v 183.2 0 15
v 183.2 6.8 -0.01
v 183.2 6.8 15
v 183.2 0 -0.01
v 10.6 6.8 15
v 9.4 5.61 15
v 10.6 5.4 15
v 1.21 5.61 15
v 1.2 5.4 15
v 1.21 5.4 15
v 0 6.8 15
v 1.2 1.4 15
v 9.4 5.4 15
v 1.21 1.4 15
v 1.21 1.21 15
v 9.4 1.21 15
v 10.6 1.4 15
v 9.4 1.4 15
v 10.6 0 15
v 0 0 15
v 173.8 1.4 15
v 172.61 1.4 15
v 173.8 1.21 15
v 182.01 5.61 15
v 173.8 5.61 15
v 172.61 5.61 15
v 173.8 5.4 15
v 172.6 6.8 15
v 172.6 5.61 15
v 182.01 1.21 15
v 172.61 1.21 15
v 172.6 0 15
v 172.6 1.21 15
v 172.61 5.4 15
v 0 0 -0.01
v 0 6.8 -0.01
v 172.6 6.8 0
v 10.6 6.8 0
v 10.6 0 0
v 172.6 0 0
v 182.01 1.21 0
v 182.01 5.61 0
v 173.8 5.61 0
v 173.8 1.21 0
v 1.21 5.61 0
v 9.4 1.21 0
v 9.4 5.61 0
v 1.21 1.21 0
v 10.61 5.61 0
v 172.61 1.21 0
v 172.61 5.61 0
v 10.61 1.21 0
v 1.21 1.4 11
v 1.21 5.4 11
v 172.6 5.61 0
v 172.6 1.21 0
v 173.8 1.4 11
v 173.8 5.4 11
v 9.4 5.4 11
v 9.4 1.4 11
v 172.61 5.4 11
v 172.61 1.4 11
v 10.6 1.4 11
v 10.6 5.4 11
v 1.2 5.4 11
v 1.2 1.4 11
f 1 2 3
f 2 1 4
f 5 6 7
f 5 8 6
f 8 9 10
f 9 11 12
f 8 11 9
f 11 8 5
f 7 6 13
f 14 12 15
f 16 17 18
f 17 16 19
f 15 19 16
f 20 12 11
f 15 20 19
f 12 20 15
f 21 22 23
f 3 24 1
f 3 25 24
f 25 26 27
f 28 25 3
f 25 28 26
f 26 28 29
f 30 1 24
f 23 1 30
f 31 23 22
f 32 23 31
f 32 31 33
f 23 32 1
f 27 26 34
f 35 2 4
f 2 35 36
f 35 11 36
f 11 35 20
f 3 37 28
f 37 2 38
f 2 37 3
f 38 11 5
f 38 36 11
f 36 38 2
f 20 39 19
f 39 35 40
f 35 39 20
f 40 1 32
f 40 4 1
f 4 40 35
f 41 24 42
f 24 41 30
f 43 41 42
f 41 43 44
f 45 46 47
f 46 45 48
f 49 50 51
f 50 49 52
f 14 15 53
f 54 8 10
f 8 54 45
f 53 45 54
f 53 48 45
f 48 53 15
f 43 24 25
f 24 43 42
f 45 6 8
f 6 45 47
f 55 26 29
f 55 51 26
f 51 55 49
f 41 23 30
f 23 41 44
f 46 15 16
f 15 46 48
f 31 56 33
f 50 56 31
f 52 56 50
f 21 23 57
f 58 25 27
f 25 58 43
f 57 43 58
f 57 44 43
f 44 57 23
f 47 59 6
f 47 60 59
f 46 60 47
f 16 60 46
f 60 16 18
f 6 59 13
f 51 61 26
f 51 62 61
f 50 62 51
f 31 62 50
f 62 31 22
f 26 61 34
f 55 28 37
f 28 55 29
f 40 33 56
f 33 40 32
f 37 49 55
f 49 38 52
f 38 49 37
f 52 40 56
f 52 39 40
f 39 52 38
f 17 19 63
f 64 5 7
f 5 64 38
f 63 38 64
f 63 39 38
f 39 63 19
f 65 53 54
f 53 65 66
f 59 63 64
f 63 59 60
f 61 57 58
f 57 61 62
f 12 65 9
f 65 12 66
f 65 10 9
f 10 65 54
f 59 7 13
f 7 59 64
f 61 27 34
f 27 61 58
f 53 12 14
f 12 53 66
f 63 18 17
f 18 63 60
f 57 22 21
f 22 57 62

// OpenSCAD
// file: ../Base/Boxes.scad
// Fischertechnik Box Foundation
// Pre-designed Boxes

use <Constants.scad>

include <PlacementOptions.scad>

box190Width = 190;
box190Depth = 130;
box130Width = 130;
box130Depth = 95;

// Values are from an original ec3 box
topBottomDifference = 1.5;
outerHeight = 40;
baseThickness = 1.8;
innerHeight = outerHeight - baseThickness;
stackExcess = 5.7;
radius = 3.5;
wallThickness = 1.5;
tolerance = 0.2;

boxWallThickness = wallThickness;
boxBaseThickness = baseThickness;
boxWebWidth = 3.0;

// getBoxWallThickness()
// Gets the wall thickness of a Fischertechnik Box
function getBoxWallThickness() = boxWallThickness;

// getBoxUsageHeight(height = 38.2)
// Gets the usable height of a Fischertechnik box
// height = Outer height of the box from the bottom to the upper edge.
function getBoxUsageHeight(height = outerHeight) = height - baseThickness - stackExcess;

// getBoxInnerHeight()
// Gets the inner height of a Fischertechnik box, including the stack excess
function getBoxInnerHeight() = innerHeight;

// getBoxBaseThickness()
// Gets the thickness of the Fischertechnik box base.
function getBoxBaseThickness() = boxBaseThickness;

// getBoxWebWidth()
// Gets the width of a box web
function getBoxWebWidth() = boxWebWidth;

// getBox190Space()
// Gets the usable inner space of a Box 190 as an x/y-list
function getBox190Space() = [
    box190Width - 2*getBoxWallThickness() - topBottomDifference, 
    box190Depth - 2*getBoxWallThickness() - topBottomDifference ];

// RoundedCornerPlate(width, depth, height, radius)
// Creates a body plate with rounded corners for a box. Used
// also to create the complete box with the hull module.
// width = Width of the plate
// depth = depth of the plate 
// height = thickness of the plate
// radius = radius of the rounded corner
module RoundedCornerPlate(width, depth, height, radius) {
    translate([radius, radius])
    hull() {
        w = width-2*radius;
        d = depth-2*radius;
        cube([w, d, height]);
        cylinder(height, r=radius, $fn=getFragments());
        translate([w, 0])
            cylinder(height, r=radius, $fn=getFragments());
        translate([w, d])
            cylinder(height, r=radius, $fn=getFragments());
        translate([0, d])
            cylinder(height, r=radius, $fn=getFragments());
    }
}

// BoxBase(width, depth)
// Creates an empty stackable Fischertechnik compatible box
// width = Outer width of the box (190, 130, ...)
// depth = Outer depth of the box (130, 95, ...)

module BoxBase(width, depth, height=outerHeight) {    
    thinPlate = 0.01;

    innerHeight = height - baseThickness;    
    
    module Body(tolerance=tolerance) {
        hull() {
            // Bottom with tolerance to fit into the original boxes when stacked
            translate([-wallThickness+tolerance, -wallThickness+tolerance, -baseThickness])
                RoundedCornerPlate(width-topBottomDifference-2*tolerance, depth-topBottomDifference-2*tolerance, thinPlate, radius);
            
            // Top
            translate([-wallThickness-topBottomDifference/2, -wallThickness-topBottomDifference/2, innerHeight-thinPlate])
                RoundedCornerPlate(width, depth, thinPlate, radius);
         }
    }

    module Cutoff() {
        hull() {
            coWidth = width - 2*wallThickness;
            coDepth = depth - 2*wallThickness;
            
            // Bottom
            RoundedCornerPlate(coWidth-topBottomDifference, coDepth-topBottomDifference, thinPlate, radius);

            // Top
            translate([-topBottomDifference/2, -topBottomDifference/2, innerHeight+thinPlate]) 
                RoundedCornerPlate(coWidth, coDepth, thinPlate, radius);
        }
    }
    
    difference() {        
        Body();
        Cutoff();
        stackOffset = innerHeight - stackExcess;
        translate([0, 0, stackOffset + baseThickness])
            Body(tolerance=0);
    }
}

// Creates the Fischertechnik empty box 130x190 mm and places it at position 0,0
// 190x130 are the outer sizes, the inner space is slightly smaller. Use getBox190Space() to get the inner sizes.
// The box is positioned that the usable inner space is at the 0,0,0 position.

module Box190() {
    BoxBase(box190Width, box190Depth);
}

// Gets the usable inner space of a Box 130 as an x/y-list
function getBox130Space() = [
    box130Width - 2*getBoxWallThickness() - topBottomDifference, 
    box130Depth - 2*getBoxWallThickness() - topBottomDifference ];

// Creates the Fischertechnik empty box 95x130 mm and places it at position 0,0
// 190x130 are the outer sizes, the inner space is slightly smaller. Use getBox190Space() to get the inner sizes.
// The box is positioned that the usable inner space is at the 0,0,0 position.

module Box130() {
    BoxBase(box130Width, box130Depth);
}

// Creates a web at the specified box walls
// corner 0 = LowerLeft, 1 = UpperLeft, 2 = UpperRight, 3 = LowerRight
// side 0 = LeftOfCorner, 1 = RightOfCorner
// distance = Distance in mm from the corner
// boxSpace = inner width and depth of the box (default: Box 190)
// webWidth = length of the web (default is 3 mms)
// webThickness = thickness of the web (default is 1 mm)
// height = Height of the web (standard is getBoxUsageHeight())
// sink = How much of the web is sunk into the wall

module BoxWeb(
    corner, 
    side, 
    distance, 
    boxSpace=getBox190Space(), 
    webWidth=getBoxWebWidth(), 
    webThickness=1.0, 
    height=getBoxUsageHeight(),
    sink = getBoxWallThickness()/2) {
    width = (corner % 2 == 0) ? 
            (side == LeftOfCorner ? webWidth : webThickness) :
            (side == LeftOfCorner ? webThickness : webWidth);

    depth = (corner % 2 == 0) ? 
            (side == RightOfCorner ? webWidth : webThickness) :
            (side == RightOfCorner ? webThickness : webWidth);
    
    xDiff = corner == LowerLeft ? 
                (side == LeftOfCorner ? -sink : distance) :
            (corner == UpperLeft ?                
                (side == LeftOfCorner ? distance : -sink) :
            (corner == UpperRight ?
                (side == LeftOfCorner ? boxSpace.x-webWidth+sink : boxSpace.x-distance-webThickness) :
                (side == LeftOfCorner ? boxSpace.x-distance-webThickness: boxSpace.x-webWidth+sink)));

    yDiff = corner == LowerLeft ? 
                (side == RightOfCorner ? -sink : distance) :
            (corner == UpperLeft ?
                (side == RightOfCorner ? boxSpace.y-distance-webThickness : boxSpace.y-webWidth+sink) :
            (corner == UpperRight ?
                (side == RightOfCorner ? boxSpace.y-webWidth+sink : boxSpace.y-distance-webThickness) :
                (side == RightOfCorner ? distance : -sink)));
    
    translate([xDiff, yDiff, -getExcess()])
        cube([width, depth, height + 2*getExcess()]);
}
// file: ../Base/Rotation.scad
// Fischertechnik Box Foundation
// Geometry Helpers Rotation

include <PlacementOptions.scad>

// getRotatedSpace(space, rotation=NoRotation)
// Rotates the space dependent on the specified rotation

function getRotatedSpace(space, rotation=NoRotation) = [
    (rotation == Rotate90 || rotation == Rotate270) ? space.y : space.x,
    (rotation == Rotate90 || rotation == Rotate270) ? space.x : space.y
];

// Rotates the given space around the fixed left lower corner
// space = the space the children needs as width/depth list [width,depth]
// rotation = 0 Rotate0 degrees, 1 Rotate90 degrees, 2 Rotate180 degrees, 3 Rotate270 degrees (equivalent to -90)

module RotateFix(space, rotation=NoRotation) {
    dy = (rotation == Rotate0 || rotation == Rotate270) ? 0 :
        (rotation == Rotate90) ? space.x :
        space.y;
    dx = (rotation < Rotate180) ? 0 :
        (rotation == Rotate180) ? space.x :
        space.y;
    
    translate([dx, dy, 0])
        rotate([0, 0, rotations[rotation]])
            children();
}
// file: ../Base/Alignment.scad
// Fischertechnik Box Foundation
// Geometry Helpers Alignment

include <PlacementOptions.scad>

// getAlignedX(elementWidth, spaceWidth, align=AlignRight, offset=0)
// Gets the aligned X offset of an element with the given
// width in the given space.
// elementWidth = The width of the element to positon
// spaceWidth = The space where the element should be aligned
// align = 0 AlignLeft, 1 AlignCenter, 2 AlignRight
// offset = an optional offset from the aligned position. When
// aligned left or centered, then positive values are in X direction.
// When aligned right then positive values are in negative X direction.

function getAlignedX(elementWidth, spaceWidth, align=AlignRight, offset=0) =
    (align == AlignLeft) ?
        offset :
        ((align == AlignCenter) ?
        (spaceWidth - elementWidth)/2 + offset :
        spaceWidth - offset - elementWidth);

// getAlignedY(elementDepth, spaceDepth, align=AlignTop, offset=0)
// Gets the aligned Y offset of an element with the given
// depth in the given space.
// elementDepth = The depth of the element to positon
// spaceDepth = The space where the element should be aligned
// align = 0 AlignBottom, 1 AlignCenter, 2 AlignTop
// offset = an optional offset from the aligned position. When
// aligned bottom or centered, then positive values are in Y direction.
// When aligned top then positive values are in negative Y direction.

function getAlignedY(elementDepth, spaceDepth, align=AlignTop, offset=0) =
    (align == AlignBottom) ?
        offset :
        ((align == AlignCenter) ?
        (spaceDepth - elementDepth)/2 + offset :
        spaceDepth - offset - elementDepth);
// file: ../Base/PlacementOptions.scad
// Fischertechnik Box Foundation
// Placement Options

// Alignment
NoAlign = 0;
AlignLeft = 1;
AlignBottom = 2;
AlignCenter = 3;
AlignRight = 4;
AlignTop = 5;

// Element rotation degree steps
rotations = [0, -90, -180, -270];

// Rotation
NoRotation = 0;
Rotate0 = 0;
Rotate90 = 1;
Rotate180 = 2;
Rotate270 = 3;

// Docking (seen from above)
NoDock = -1;
DockLeft = 0;
DockTop = 1;
DockRight = 2;
DockCorner = 2;
DockBottom = 3;

// Web corners
LowerLeft = 0;
UpperLeft = 1;
UpperRight = 2;
LowerRight = 3;

// Web position relative to corner
LeftOfCorner = 0;
RightOfCorner = 1;

// Rails direction
Horizontal = true;
Vertical = false;
// file: ../Base/Placement.scad
// Fischertechnik Box Foundation
// Geometry Helpers Placement

use <Constants.scad>
use <Alignment.scad>
use <Rotation.scad>
use <Boxes.scad>

include <PlacementOptions.scad>

// Place(x=0, y=0, elementSpace=[0,0], alignX=AlignLeft, alignY=AlignBottom, rotation=Rotate0, boxSpace=getBox190Space())
// Places the child at the specified position
// y = Y-Position. This is a relative position when an X aligment is specified.
// x = X-Position. This is a relative position when an Y aligment is specified.
// elementSpace = space of the element to be placed [x,y]
// alignX = -1=NoAlign, 0 AlignLeft, 1 AlignCenter, 3 AlignRight (elementSpace and boxSpace required!)
// alignY = -1=NoAlign, 2 AlignBottom, 1 AlignCenter, 4 AlignTop (elementSpace and boxSpace required!)
// rotation = 0 Rotate0 0 degrees, 1 Rotate90 90 degrees, 
// 2 Rotate180 180 degrees, 3 Rotate270 270 degrees (equivalent to -90)
// boxSpace = Inner space of the box where the placement occurs [x,y] - default is Box 190x130 inner space

module Place(x=0, y=0, elementSpace=[0,0], 
  alignX=AlignLeft, alignY=AlignBottom, 
  rotation=NoRotation, boxSpace=getBox190Space()) {

    module Position(x, y, space, rotation=Rotate0) {
        translate([x, y, 0])
            RotateFix(space, rotation)
                children();
    }

    space = getRotatedSpace(elementSpace, rotation);
    alignedX = getAlignedX(space.x, boxSpace.x, alignX, x);
    alignedY = getAlignedY(space.y, boxSpace.y, alignY, y);
    Position(alignedX, alignedY, elementSpace, rotation)
        children();
}

// Center(space=getBox130Space(), elementSpace=[0,0])
// space = Space where the children is centered. For cylinder use centered=true and no elementSpace.
// elementSpace = space of the element to be centered [x,y]

module Center(space=getBox190Space(), elementSpace=[0,0]) {
    Place(elementSpace=elementSpace, boxSpace=space, alignX=AlignCenter, alignY=AlignCenter)
        children();
}

// CenterHorizontal(width=0, y=0, offset=0, space=getBox130Space())
// width = Width of the element to be placed.
// y = Y position of the element
// offset = Offset from the center position (negative will be left of the center)
// space = Space where the element is placed

module CenterHorizontal(width=0, y=0, offset=0, space=getBox190Space()) {
    Place(x=offset, y=y, elementSpace=[width, 0], boxSpace=space, alignX=AlignCenter)
        children(0);
}

// CenterVertical(depth=0, x=0, offset=0, space=getBox130Space())
// depth = Depth of the element to be placed.
// x = X position of the element
// offset = Offset from the center position (negative will be down of the center)
// space = Space where the element is placed

module CenterVertical(depth=0, x=0, offset=0, space=getBox190Space()) {
    Place(x=x, y=offset, elementSpace=[0, depth], boxSpace=space, alignY=AlignCenter)
        children(0);
}

// getIsVertical(align)
// True if the specified alignment needs a vertical orientation for a divider (AlignRight, AlignLeft)

function getIsVertical(align) = (align == AlignRight || align == AlignLeft);

// getIsHorizontal(align)
// True if the specified alignment needs a horizontal orientation for a divider (AlignTop, AlignBottom)

function getIsHorizontal(align) = (align == AlignTop || align == AlignBottom);
// file: ../Base/Constants.scad
// Fischertechnik Box Foundation
// Constants

// Constant values necessary for multiple elements

// Base constants
dividerThickness = 1.2;
excess = 0.01;
fragments = 90;
tolerance = 0.8;

// Gets the thickness of a divider 
function getDividerThickness() = dividerThickness;

// Gets the excess that is used to merge walls into each other
function getExcess() = excess;

// Gets amount of fragments of a cylinder
function getFragments() = fragments;

// Gets the inner tolerance of a frame to each side
function getTolerance() = tolerance;


// Fischertechnik specific constants
axisDiameter = 4;
axisBottomDiameter = axisDiameter + 1;
axisTolerance = 0.2;
axisLockingLength = 8;

// Gets axis diameter of Fischertechnik axis
function getAxisDiameter() = axisDiameter;

// Gets axis diameter tolerance (subtracted for element axis)
function getAxisTolerance() = axisTolerance;

// Gets the axis diameter for standing axis
function getStandAxisDiameter() = getAxisDiameter() - getAxisTolerance();

// Gets axis bottom diameter for thicker part at the bottom
function getAxisBottomDiameter() = axisBottomDiameter;

// Gets the lengthh of the locking part of a locking axis
function getAxisLockingLength() = axisLockingLength;

// Studs

studHeight = 2.5;
studTolerance = 0.2;
studRailDistance = 9;   // as in ft 50

// gets the height of a connecting stud
function getStudHeight() = studHeight;

// gets the connecting stud height tolerance
function getStudTolerance() = studTolerance;

// gets the default rail distance for studs
function getStudRailDistance() = studRailDistance;

// Dockable Frame with Edge

standardEdgeDistance = 2.5;
standardWebDistance = 11.5;
standardCornerLength = 15;

// gets the standard distance to the wall of the box for dockable frames with webs
function getStandardEdgeDistance() = standardEdgeDistance;

// gets the standard distance of each web to the corner of the dockable frame
function getStandardWebDistance() = standardWebDistance;

// gets the standard length of the corner walls of a dockable frame
function getStandardCornerLength() = standardCornerLength;

// Tubes

tubeWallFactor = 0.8;

// gets the wall thickness of a tube.
function getTubeWallThickness() = tubeWallFactor * getDividerThickness();

// Small Parts and Divider Frame

smallPartsFrameHeight = 20;

// gets the frame height for docked small parts boxes.
function getSmallPartsFrameHeight() = smallPartsFrameHeight;

// Hubs

hubRingDiameter = 19.5;
hubRingLevelDiameter = 21;

// gets the diameter of a tube matching the inner ring of a wheel
function getHubRingDiameter() = hubRingDiameter;

// gets the diameter of a hub tube with a thicker diameter
function getHubRingLevelDiameter() = hubRingLevelDiameter;

// Struts

strutAddLength = 9.0;
strutDepth = 8.0;

// gets the full length of a strut
function getFullStrutLength(length) = length + strutAddLength;

// gets the radius of the end of a strut
function getStrutEndRadius() = strutAddLength / 2;

// gets the the depth of a strut
function getStrutDepth() = strutDepth;

// Propeller

propellerAxisDiameter = 7.0;
propellerAxisTolerance = 0.2;

// gets the propeller axis outer diameter
function getPropellerAxisDiameter() = propellerAxisDiameter;

// gets the propeller axis printing tolerance
function getPropellerAxisTolerance() = propellerAxisTolerance;
// main file
// Fischertechnik Box Library
// Frame for single 180 mm Axis
// 37527

use <../ModelBase/Complex.scad>

/* [Element Parameters] */
count = 1;

/* [Hidden] */
length = 180;

// getFrameAxis180Space(count=1)
// Gets the width (.x) and depth (.y) of the axis frame.
// count = Count of axis

function getFrameAxis180Space(count=1) = getFrameAxisSpace(length, count);

// FrameAxis180(count=1)
// Axis holder for a single 90 mm axis.
// count = Count of axis

module FrameAxis180(count=1) {
    FrameAxis(length, count);
}

// Test
color("lightgray")
FrameAxis180(count);
